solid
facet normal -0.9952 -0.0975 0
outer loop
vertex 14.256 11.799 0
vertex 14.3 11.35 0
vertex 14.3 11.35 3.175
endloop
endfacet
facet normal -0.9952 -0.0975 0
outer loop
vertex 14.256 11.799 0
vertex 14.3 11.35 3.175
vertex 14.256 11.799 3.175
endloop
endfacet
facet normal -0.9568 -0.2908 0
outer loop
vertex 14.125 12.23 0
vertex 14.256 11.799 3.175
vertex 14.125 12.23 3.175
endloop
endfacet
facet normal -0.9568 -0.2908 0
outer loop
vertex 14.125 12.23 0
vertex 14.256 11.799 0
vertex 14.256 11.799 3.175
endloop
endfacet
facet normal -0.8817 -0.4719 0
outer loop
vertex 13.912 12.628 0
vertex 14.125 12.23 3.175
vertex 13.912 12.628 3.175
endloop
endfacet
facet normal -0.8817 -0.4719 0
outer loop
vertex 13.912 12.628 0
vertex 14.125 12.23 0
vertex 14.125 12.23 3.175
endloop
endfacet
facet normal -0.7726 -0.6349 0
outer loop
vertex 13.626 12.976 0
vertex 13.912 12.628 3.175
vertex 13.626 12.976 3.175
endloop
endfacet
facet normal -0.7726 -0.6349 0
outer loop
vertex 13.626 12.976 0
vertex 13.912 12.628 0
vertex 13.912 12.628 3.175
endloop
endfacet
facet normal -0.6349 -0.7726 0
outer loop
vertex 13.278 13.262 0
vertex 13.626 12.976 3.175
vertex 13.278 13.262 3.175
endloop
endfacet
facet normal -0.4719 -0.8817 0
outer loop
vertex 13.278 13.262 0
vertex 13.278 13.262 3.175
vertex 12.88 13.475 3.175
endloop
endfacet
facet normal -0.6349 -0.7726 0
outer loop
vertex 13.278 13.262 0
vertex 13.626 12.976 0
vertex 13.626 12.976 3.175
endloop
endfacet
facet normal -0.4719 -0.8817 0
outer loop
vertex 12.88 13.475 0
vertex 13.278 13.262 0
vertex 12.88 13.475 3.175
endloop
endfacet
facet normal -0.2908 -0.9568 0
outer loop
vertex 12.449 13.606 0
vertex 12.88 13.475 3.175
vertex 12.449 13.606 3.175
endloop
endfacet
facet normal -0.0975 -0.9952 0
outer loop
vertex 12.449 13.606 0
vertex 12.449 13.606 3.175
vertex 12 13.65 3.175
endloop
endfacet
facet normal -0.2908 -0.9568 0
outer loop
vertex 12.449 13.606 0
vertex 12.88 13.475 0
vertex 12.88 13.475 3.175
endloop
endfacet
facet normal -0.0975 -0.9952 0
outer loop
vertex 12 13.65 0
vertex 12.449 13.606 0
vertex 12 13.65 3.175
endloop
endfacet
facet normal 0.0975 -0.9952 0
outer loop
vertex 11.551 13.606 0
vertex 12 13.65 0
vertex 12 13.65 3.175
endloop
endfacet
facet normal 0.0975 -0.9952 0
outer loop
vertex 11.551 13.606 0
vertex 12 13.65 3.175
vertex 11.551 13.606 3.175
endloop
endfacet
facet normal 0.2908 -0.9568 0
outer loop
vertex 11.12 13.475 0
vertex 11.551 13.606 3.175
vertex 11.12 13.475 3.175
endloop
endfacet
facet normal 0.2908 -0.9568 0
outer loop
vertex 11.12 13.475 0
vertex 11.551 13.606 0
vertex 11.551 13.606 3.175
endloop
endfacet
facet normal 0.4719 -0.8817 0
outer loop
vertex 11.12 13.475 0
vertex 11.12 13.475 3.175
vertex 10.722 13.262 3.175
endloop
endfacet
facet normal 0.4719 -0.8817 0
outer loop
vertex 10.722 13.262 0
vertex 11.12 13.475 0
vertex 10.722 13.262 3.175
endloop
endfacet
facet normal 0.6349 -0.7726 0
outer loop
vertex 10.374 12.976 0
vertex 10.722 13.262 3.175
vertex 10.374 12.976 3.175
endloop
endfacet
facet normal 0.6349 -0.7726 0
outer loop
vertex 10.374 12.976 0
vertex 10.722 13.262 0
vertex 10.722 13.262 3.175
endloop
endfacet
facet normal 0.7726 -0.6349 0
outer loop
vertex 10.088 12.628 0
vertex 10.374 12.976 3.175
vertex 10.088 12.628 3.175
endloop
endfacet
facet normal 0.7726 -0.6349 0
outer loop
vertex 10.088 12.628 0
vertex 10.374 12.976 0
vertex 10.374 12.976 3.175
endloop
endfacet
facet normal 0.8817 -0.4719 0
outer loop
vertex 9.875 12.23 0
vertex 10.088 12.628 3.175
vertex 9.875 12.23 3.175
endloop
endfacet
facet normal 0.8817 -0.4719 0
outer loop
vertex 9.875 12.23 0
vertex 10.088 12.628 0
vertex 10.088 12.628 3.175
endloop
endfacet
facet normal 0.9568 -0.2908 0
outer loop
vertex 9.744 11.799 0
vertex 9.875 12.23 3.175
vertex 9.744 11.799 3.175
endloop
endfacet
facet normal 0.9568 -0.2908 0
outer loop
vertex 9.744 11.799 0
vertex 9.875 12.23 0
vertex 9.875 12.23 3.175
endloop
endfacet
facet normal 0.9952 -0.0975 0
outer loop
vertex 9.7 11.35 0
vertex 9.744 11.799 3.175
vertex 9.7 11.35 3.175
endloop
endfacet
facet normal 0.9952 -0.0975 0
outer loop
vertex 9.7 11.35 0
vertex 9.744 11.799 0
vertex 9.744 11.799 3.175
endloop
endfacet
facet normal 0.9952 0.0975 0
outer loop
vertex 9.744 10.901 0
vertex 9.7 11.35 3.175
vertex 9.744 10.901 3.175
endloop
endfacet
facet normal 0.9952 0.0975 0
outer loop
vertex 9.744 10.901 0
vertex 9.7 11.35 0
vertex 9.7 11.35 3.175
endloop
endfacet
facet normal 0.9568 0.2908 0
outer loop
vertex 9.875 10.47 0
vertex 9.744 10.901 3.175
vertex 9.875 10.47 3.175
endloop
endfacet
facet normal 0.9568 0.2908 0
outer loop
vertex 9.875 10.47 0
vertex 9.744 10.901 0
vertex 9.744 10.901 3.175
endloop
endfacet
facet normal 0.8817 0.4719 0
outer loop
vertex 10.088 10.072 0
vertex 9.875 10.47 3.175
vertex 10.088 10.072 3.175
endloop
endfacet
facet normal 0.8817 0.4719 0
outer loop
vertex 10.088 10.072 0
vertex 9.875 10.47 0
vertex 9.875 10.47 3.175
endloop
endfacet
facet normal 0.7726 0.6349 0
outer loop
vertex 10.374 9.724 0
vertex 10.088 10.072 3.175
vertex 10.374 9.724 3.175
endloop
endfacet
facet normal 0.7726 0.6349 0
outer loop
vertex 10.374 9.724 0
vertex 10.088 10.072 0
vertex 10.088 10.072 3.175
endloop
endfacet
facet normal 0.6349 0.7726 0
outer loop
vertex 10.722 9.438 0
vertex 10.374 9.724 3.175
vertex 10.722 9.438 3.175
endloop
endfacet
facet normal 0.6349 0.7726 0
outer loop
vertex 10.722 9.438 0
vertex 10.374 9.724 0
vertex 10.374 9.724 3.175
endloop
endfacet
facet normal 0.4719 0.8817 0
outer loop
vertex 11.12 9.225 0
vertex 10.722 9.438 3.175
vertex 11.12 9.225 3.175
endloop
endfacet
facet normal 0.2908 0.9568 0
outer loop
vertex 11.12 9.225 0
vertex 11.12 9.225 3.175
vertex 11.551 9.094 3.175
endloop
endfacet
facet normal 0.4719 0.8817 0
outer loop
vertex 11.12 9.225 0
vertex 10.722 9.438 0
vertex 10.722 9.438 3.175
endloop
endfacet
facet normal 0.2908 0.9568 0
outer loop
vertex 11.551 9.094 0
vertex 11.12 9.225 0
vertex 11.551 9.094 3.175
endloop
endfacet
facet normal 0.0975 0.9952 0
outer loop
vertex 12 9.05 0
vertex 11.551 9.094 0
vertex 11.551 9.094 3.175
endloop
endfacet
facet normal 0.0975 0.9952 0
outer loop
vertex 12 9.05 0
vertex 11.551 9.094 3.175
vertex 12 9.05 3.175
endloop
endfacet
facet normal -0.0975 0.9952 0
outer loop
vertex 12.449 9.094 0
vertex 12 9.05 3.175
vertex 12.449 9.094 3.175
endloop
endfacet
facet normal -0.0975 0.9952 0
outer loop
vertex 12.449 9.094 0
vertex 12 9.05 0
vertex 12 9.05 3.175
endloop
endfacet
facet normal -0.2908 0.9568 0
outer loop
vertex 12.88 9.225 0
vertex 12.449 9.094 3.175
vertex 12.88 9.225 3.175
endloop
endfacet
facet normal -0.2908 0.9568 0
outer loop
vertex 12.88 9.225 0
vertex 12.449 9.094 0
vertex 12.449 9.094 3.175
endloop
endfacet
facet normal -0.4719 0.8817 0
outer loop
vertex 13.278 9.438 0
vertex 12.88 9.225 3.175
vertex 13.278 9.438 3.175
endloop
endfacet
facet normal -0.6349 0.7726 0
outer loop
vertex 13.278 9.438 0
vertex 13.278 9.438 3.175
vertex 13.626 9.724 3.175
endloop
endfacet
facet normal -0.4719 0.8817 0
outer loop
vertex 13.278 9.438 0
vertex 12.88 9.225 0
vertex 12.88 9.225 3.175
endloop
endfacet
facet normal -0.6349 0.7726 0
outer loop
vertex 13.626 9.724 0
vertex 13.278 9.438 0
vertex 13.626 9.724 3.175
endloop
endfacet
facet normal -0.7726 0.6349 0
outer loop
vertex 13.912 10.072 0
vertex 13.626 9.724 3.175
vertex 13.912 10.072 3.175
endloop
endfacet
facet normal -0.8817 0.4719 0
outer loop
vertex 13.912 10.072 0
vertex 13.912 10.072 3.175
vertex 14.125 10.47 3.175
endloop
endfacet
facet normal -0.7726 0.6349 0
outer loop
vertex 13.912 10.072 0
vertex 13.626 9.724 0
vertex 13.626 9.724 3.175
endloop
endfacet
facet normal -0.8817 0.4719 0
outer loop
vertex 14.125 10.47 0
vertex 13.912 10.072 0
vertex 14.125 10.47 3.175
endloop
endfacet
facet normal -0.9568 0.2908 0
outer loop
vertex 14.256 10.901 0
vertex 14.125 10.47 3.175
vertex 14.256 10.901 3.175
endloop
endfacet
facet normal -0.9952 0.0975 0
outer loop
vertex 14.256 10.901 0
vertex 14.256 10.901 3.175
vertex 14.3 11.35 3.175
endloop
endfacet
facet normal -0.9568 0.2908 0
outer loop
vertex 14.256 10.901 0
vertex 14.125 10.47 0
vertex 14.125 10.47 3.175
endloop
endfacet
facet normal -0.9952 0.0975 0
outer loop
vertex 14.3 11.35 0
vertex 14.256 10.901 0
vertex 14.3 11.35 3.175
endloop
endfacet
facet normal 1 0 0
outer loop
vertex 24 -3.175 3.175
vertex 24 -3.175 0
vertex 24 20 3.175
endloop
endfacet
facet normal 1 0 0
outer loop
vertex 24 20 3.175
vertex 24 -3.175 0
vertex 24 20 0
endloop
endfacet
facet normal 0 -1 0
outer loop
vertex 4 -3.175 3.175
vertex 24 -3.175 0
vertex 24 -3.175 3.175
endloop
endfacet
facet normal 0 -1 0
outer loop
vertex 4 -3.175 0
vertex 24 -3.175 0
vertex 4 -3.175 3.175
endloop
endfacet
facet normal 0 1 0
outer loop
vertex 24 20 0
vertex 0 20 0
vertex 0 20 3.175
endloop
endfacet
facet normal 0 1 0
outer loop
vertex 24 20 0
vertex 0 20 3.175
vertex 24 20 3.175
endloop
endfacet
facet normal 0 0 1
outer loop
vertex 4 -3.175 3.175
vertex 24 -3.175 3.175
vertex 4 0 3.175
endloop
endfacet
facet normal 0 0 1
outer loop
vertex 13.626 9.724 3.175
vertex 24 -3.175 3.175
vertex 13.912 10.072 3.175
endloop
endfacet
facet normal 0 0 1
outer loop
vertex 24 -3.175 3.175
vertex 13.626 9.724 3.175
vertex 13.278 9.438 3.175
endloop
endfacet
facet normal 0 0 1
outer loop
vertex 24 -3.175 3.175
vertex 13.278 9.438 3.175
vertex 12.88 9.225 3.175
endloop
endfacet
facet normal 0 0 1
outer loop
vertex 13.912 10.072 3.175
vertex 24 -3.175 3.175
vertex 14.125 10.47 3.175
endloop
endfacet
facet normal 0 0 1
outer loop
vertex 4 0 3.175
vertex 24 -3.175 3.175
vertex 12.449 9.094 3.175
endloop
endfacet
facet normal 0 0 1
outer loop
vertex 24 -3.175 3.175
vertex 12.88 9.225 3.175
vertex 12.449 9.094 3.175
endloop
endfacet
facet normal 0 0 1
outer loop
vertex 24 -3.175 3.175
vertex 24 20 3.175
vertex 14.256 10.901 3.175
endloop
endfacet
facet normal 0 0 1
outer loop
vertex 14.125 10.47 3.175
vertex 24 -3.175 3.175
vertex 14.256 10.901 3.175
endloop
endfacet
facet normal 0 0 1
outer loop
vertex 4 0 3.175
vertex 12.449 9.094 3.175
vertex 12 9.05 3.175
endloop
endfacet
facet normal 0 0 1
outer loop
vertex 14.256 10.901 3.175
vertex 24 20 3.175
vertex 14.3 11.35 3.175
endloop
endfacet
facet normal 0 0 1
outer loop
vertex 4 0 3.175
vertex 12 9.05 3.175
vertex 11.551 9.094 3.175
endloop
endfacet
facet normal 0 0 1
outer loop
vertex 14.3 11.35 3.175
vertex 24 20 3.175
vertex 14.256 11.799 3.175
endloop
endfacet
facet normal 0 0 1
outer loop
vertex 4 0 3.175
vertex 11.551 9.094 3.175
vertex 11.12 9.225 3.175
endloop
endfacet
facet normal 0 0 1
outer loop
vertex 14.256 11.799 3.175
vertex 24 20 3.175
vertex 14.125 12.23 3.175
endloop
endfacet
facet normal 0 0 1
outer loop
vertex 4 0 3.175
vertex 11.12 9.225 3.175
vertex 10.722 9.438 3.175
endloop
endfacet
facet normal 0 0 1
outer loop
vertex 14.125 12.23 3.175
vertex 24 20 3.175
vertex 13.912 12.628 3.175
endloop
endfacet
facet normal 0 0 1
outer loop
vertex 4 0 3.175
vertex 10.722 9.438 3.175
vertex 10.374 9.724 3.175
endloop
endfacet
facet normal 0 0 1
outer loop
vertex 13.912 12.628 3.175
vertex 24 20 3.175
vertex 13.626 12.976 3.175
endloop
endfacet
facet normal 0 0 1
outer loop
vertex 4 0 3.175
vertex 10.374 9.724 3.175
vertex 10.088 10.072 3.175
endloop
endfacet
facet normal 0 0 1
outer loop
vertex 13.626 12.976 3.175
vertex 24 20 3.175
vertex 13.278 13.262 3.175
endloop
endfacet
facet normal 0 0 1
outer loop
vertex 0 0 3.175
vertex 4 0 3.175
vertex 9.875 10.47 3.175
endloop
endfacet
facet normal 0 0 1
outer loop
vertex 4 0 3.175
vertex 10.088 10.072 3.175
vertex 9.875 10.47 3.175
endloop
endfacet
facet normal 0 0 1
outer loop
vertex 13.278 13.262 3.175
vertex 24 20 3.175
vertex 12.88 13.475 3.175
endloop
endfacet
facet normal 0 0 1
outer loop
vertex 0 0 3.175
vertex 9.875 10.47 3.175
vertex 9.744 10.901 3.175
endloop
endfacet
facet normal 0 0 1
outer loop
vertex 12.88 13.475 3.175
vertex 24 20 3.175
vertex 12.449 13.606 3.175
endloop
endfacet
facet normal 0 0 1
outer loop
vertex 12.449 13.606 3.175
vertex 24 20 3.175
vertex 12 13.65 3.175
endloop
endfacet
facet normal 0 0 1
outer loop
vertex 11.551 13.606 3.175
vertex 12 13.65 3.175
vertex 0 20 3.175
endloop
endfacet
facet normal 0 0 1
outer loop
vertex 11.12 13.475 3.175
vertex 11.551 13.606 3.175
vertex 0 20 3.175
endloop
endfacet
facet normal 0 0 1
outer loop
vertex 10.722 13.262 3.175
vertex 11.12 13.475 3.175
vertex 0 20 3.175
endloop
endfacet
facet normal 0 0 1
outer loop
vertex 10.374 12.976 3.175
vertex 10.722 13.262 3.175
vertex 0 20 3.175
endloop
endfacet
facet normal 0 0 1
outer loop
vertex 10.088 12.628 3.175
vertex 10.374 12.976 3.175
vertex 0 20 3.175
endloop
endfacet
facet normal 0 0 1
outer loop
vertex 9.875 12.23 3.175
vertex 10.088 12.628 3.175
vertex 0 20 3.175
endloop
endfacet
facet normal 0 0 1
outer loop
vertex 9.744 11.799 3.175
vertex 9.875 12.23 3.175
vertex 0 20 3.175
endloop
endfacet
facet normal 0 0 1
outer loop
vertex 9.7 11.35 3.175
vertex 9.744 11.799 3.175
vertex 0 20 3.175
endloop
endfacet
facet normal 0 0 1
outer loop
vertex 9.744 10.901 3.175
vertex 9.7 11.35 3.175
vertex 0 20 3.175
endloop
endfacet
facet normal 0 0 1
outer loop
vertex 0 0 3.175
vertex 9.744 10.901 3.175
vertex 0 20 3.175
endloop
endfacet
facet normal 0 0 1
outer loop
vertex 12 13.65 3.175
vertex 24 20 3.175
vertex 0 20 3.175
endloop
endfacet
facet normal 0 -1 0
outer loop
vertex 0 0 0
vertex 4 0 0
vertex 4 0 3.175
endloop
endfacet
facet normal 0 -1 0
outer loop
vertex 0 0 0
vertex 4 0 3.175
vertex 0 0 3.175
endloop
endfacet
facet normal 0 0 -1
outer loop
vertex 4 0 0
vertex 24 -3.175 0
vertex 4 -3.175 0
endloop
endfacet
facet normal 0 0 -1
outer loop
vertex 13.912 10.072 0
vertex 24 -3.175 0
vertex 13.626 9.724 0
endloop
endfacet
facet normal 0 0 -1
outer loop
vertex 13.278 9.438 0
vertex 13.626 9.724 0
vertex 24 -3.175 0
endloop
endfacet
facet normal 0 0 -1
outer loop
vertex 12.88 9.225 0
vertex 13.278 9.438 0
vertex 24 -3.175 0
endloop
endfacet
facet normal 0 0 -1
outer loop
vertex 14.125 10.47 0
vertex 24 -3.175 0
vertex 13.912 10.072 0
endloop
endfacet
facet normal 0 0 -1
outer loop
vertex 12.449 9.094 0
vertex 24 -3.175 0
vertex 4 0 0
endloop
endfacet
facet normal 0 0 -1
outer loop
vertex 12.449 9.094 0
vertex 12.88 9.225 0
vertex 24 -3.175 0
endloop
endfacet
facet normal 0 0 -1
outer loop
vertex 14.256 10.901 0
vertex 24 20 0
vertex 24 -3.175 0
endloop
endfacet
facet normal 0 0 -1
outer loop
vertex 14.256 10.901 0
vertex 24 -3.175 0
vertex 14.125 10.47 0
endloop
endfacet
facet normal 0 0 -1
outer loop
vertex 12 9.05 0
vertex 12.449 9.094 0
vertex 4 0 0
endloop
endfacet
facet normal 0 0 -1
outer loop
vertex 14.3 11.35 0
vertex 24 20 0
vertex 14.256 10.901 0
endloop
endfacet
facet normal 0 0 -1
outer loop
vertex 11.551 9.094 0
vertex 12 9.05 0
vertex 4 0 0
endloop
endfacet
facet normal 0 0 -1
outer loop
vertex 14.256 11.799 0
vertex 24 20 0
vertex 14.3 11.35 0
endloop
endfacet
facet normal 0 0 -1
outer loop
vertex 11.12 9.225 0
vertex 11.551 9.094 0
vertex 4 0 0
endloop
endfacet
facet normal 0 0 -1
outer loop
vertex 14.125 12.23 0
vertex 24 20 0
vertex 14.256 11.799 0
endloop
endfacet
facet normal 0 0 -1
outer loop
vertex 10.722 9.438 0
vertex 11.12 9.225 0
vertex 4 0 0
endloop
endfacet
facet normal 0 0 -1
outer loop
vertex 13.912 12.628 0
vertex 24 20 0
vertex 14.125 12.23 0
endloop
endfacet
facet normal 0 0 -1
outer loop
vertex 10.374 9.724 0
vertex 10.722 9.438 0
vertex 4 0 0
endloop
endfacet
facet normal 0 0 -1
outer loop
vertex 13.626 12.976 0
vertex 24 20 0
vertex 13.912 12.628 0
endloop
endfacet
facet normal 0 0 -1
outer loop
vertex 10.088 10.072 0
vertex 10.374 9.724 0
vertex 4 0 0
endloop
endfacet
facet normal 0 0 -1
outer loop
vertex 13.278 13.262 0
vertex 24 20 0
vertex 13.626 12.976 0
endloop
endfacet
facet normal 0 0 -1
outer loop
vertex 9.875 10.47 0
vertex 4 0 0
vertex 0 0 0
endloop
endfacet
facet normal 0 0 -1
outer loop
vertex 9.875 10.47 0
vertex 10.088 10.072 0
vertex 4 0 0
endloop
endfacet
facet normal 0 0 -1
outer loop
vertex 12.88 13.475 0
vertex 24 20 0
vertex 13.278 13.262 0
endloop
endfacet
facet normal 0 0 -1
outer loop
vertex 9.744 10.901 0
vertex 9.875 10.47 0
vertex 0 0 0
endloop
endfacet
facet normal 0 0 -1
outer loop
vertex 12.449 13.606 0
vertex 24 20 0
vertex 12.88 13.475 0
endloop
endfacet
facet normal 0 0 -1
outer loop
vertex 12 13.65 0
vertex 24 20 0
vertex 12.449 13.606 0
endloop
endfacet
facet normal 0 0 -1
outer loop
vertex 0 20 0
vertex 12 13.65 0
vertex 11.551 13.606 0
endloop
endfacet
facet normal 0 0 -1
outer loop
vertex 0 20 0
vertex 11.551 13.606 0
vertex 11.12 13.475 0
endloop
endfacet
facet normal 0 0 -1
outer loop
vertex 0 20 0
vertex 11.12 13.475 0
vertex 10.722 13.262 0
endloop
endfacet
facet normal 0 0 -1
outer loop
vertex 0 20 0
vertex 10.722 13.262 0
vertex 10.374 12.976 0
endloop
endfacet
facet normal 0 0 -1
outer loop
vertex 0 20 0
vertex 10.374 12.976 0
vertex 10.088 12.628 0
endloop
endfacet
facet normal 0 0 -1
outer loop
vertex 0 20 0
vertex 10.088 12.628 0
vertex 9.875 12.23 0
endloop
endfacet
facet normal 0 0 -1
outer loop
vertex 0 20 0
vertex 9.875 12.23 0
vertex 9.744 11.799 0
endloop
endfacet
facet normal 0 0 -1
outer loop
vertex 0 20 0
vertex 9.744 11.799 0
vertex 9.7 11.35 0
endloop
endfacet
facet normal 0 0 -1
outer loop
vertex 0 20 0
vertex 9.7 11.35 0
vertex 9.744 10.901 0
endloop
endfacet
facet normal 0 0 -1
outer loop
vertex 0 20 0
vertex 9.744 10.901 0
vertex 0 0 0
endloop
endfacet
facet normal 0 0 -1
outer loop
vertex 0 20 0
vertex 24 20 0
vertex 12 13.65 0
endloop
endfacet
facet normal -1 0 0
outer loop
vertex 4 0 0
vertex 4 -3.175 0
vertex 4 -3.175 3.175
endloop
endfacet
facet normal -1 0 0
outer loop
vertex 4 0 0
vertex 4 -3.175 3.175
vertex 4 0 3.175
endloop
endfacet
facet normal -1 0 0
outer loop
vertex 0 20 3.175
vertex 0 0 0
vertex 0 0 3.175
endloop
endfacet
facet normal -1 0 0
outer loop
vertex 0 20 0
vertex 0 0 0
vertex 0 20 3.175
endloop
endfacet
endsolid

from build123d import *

# Parameters (mm, degrees)
SKETCH1_R           = 2.3
BOSS_EXTRUDE1_DEPTH = 3.175


with BuildPart() as part:
    # Sketch1 → Boss-Extrude1 (new body)
    with BuildSketch(Plane.XY):
        Polygon((0, 0), (0, 20), (24, 20), (24, 0), (24, -3.175), (4, -3.175), (4, 0), align=None)
        with Locations((12, 11.35)):
            Circle(SKETCH1_R, mode=Mode.SUBTRACT)
    extrude(amount=BOSS_EXTRUDE1_DEPTH)


solid = part.part
